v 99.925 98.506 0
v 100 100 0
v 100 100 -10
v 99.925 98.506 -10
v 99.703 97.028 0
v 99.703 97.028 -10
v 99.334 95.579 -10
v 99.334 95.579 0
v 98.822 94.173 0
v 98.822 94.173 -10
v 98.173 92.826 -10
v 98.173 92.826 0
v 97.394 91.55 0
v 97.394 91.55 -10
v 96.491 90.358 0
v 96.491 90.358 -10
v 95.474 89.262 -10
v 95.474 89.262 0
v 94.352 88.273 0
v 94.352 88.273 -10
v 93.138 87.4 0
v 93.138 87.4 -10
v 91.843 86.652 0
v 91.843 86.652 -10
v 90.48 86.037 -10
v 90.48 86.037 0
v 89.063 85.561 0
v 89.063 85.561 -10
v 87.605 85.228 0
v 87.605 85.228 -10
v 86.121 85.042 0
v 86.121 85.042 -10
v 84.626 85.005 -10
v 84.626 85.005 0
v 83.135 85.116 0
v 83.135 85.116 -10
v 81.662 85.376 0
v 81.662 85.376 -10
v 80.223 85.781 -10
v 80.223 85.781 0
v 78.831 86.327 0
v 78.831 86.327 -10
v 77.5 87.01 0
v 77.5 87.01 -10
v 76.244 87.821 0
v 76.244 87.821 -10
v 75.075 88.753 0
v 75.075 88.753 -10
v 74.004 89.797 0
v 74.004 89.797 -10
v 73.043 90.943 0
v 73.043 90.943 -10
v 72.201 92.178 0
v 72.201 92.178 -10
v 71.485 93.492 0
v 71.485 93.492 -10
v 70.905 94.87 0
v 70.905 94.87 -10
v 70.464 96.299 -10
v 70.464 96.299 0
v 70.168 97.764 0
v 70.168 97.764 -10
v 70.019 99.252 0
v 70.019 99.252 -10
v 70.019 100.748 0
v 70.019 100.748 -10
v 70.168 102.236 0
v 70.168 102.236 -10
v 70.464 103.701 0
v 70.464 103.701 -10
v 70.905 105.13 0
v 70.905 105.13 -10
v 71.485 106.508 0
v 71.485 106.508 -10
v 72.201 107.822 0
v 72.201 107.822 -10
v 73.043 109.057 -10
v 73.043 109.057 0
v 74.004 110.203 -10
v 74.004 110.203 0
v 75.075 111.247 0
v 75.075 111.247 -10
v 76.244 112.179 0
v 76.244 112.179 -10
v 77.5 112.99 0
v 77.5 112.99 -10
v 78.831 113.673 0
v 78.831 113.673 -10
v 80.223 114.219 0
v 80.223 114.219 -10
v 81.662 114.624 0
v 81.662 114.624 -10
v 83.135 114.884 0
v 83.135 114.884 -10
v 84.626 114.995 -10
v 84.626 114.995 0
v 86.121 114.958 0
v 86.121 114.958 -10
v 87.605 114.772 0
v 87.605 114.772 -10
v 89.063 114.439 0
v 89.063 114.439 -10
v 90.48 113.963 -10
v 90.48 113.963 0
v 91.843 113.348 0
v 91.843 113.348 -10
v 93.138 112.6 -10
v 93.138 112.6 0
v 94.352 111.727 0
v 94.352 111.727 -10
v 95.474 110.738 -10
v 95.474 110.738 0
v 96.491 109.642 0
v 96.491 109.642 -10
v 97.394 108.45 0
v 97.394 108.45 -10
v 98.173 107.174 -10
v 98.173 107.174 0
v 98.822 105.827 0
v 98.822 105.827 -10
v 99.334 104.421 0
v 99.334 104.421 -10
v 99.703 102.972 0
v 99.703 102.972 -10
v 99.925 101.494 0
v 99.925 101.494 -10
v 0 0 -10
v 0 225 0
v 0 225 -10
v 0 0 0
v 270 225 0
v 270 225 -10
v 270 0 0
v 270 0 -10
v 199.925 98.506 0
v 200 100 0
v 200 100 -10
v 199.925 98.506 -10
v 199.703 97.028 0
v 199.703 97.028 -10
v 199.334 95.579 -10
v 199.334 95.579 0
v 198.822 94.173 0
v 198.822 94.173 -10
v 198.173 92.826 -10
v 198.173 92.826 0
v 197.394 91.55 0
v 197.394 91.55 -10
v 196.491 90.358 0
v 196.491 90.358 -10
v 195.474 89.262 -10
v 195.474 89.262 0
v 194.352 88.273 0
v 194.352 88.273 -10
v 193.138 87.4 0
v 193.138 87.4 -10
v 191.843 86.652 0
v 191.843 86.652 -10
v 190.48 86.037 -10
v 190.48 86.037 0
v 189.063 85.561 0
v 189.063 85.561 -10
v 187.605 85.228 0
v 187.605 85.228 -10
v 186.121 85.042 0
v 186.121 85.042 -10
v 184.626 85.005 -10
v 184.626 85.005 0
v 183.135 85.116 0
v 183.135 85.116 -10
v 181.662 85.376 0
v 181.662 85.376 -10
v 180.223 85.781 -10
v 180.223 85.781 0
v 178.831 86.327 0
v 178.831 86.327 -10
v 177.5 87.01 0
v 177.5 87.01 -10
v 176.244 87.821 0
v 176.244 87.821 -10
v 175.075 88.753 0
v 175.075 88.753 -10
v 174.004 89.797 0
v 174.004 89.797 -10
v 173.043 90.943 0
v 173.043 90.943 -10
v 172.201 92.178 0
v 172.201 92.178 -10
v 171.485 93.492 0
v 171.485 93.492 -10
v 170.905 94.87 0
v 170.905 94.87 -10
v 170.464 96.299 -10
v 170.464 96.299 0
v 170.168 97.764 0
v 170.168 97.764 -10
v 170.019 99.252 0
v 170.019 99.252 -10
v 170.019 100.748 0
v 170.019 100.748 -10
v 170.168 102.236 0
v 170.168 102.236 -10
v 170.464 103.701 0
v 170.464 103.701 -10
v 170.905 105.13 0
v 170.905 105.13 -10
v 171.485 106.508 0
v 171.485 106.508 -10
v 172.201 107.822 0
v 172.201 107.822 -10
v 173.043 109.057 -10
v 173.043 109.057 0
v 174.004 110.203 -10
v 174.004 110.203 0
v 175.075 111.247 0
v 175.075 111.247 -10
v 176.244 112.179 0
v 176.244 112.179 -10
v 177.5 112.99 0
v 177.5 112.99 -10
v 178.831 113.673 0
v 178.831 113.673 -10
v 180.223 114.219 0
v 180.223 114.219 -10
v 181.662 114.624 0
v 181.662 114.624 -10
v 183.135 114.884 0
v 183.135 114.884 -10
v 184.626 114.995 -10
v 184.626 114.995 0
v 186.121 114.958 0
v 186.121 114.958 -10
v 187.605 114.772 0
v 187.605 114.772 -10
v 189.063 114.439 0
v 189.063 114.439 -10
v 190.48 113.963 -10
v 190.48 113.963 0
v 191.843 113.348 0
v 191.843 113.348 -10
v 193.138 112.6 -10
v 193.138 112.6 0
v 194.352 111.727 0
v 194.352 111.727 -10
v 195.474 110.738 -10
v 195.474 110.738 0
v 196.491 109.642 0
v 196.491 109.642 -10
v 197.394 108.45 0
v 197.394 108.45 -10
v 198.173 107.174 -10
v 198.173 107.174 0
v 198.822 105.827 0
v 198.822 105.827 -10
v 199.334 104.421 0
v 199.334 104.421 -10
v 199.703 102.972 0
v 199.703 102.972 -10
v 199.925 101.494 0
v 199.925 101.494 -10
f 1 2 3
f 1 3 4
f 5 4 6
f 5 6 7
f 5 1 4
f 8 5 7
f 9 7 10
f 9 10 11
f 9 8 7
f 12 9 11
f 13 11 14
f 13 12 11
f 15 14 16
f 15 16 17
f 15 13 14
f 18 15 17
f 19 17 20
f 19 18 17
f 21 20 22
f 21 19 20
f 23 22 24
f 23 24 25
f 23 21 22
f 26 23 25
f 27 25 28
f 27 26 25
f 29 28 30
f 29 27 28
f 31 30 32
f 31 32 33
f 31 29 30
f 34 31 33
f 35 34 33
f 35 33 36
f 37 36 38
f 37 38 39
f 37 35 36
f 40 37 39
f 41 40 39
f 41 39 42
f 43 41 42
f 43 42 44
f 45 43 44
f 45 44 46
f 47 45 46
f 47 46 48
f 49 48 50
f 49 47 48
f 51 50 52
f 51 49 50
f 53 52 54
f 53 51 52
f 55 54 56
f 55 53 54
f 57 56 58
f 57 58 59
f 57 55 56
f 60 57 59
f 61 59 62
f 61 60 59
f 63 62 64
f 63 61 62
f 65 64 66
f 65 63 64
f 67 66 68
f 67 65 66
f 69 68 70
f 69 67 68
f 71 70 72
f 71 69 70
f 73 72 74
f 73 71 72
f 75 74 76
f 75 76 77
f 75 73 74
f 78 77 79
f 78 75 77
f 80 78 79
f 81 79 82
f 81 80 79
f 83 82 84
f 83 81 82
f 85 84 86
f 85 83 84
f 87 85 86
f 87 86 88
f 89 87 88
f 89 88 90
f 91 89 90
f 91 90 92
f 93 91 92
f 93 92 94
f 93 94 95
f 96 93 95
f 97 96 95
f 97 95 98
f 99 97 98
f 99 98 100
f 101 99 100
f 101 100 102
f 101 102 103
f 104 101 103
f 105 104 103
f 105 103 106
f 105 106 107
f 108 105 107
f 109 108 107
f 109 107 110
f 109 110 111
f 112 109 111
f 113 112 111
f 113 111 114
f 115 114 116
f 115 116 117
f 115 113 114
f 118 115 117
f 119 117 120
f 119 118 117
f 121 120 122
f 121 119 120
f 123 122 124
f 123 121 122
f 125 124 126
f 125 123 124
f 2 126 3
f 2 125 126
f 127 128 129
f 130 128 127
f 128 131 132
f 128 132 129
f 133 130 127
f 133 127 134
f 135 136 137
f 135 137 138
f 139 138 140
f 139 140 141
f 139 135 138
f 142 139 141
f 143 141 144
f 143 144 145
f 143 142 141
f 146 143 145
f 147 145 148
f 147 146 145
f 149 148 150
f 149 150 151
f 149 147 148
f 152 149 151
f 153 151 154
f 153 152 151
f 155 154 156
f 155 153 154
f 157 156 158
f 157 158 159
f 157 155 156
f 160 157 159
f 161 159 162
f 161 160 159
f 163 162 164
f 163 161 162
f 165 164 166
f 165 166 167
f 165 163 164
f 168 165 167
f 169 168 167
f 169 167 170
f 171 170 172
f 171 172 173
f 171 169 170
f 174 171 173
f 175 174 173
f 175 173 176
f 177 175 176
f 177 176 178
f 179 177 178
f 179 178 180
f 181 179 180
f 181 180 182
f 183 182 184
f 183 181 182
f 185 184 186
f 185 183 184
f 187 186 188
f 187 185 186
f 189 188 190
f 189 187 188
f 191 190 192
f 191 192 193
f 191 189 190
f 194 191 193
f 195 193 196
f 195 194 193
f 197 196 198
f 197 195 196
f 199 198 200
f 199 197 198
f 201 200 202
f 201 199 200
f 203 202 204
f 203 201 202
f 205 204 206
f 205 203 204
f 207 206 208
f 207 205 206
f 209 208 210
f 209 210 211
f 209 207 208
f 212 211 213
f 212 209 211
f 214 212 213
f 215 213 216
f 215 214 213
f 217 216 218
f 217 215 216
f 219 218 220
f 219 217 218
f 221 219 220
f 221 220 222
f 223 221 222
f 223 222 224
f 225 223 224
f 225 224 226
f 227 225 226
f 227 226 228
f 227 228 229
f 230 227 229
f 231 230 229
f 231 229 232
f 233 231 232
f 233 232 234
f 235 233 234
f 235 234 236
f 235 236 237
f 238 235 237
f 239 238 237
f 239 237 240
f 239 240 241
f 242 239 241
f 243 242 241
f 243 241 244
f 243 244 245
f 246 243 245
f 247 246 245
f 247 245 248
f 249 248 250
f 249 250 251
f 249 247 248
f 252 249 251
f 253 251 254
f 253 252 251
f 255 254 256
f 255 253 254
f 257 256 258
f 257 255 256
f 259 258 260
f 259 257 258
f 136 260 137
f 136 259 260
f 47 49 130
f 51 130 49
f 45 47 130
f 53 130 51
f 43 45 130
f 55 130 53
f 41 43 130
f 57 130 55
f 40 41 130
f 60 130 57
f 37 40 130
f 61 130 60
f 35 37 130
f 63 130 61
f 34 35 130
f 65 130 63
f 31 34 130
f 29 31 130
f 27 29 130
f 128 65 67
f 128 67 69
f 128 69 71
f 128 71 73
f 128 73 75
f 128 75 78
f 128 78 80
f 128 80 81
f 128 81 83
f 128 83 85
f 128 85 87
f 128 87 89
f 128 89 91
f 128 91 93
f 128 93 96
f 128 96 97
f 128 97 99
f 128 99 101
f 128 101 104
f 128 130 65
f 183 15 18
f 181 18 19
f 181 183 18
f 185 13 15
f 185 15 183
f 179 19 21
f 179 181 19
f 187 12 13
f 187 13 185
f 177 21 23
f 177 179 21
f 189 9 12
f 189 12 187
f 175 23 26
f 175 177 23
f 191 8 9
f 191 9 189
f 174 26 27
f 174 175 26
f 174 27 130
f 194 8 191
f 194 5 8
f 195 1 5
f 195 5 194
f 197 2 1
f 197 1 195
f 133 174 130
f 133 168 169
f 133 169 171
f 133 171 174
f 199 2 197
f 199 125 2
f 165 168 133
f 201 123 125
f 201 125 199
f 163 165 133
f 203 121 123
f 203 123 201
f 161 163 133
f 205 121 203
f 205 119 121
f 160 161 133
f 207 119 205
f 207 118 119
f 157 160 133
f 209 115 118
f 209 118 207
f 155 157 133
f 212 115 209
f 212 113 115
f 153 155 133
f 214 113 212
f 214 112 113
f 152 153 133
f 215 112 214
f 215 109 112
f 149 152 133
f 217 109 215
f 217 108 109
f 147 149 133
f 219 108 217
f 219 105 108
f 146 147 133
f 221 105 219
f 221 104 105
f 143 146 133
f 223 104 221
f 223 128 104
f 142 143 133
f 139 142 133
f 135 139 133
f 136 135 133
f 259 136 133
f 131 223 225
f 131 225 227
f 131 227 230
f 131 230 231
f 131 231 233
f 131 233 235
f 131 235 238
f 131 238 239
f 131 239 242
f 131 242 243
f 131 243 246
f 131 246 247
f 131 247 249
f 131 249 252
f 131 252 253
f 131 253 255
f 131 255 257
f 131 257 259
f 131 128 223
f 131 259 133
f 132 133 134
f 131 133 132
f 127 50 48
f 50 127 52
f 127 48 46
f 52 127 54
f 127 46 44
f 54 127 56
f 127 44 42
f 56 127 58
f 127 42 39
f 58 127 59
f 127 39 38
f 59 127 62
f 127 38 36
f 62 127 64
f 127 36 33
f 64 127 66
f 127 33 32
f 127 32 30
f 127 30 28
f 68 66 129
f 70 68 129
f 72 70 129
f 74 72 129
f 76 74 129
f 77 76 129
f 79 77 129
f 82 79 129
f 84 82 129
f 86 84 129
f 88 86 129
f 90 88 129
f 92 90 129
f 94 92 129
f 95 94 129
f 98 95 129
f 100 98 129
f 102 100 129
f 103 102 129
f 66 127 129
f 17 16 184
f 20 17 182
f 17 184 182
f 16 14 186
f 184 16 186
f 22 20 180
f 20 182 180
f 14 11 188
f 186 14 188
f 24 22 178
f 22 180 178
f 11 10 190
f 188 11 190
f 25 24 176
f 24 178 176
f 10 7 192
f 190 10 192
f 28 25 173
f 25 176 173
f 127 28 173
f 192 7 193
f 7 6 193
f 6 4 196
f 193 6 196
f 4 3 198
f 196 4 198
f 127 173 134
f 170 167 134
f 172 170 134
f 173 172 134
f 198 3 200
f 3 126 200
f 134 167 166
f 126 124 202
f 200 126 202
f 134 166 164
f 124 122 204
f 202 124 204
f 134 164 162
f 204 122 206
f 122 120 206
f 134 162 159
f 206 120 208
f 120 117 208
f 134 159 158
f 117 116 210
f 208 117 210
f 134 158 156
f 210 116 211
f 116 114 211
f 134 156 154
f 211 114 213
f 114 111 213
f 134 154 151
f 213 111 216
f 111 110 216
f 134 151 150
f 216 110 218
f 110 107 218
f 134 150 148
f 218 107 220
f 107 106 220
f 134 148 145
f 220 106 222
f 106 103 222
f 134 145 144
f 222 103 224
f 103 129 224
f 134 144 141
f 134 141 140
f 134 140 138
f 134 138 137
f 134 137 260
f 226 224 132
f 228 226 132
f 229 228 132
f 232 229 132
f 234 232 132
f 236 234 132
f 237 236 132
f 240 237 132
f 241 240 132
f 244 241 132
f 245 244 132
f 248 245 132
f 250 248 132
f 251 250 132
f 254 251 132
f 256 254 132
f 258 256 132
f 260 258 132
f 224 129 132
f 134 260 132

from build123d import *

# Parameters (mm, degrees)
BOSS_EXTRUDE1_DEPTH = 10


with BuildPart() as part:
    # Sketch1 → Boss-Extrude1 (new body)
    with BuildSketch(Plane.XY):
        with BuildLine():
            Line((0, 175), (0, 100))
            Line((0, 100), (70, 100))
            ThreePointArc((70, 100), (85, 115), (100, 100))
            Line((100, 100), (170, 100))
            ThreePointArc((170, 100), (185, 115), (200, 100))
            Line((200, 100), (270, 100))
            Line((270, 100), (270, 225))
            Line((270, 225), (0, 225))
            Line((0, 225), (0, 175))
        make_face()
        with BuildLine():
            Line((0, 100), (0, 0))
            Line((0, 0), (270, 0))
            Line((270, 0), (270, 100))
            Line((270, 100), (200, 100))
            ThreePointArc((200, 100), (185, 85), (170, 100))
            Line((170, 100), (100, 100))
            ThreePointArc((100, 100), (85, 85), (70, 100))
            Line((70, 100), (0, 100))
        make_face()
    extrude(amount=-BOSS_EXTRUDE1_DEPTH)


solid = part.part
